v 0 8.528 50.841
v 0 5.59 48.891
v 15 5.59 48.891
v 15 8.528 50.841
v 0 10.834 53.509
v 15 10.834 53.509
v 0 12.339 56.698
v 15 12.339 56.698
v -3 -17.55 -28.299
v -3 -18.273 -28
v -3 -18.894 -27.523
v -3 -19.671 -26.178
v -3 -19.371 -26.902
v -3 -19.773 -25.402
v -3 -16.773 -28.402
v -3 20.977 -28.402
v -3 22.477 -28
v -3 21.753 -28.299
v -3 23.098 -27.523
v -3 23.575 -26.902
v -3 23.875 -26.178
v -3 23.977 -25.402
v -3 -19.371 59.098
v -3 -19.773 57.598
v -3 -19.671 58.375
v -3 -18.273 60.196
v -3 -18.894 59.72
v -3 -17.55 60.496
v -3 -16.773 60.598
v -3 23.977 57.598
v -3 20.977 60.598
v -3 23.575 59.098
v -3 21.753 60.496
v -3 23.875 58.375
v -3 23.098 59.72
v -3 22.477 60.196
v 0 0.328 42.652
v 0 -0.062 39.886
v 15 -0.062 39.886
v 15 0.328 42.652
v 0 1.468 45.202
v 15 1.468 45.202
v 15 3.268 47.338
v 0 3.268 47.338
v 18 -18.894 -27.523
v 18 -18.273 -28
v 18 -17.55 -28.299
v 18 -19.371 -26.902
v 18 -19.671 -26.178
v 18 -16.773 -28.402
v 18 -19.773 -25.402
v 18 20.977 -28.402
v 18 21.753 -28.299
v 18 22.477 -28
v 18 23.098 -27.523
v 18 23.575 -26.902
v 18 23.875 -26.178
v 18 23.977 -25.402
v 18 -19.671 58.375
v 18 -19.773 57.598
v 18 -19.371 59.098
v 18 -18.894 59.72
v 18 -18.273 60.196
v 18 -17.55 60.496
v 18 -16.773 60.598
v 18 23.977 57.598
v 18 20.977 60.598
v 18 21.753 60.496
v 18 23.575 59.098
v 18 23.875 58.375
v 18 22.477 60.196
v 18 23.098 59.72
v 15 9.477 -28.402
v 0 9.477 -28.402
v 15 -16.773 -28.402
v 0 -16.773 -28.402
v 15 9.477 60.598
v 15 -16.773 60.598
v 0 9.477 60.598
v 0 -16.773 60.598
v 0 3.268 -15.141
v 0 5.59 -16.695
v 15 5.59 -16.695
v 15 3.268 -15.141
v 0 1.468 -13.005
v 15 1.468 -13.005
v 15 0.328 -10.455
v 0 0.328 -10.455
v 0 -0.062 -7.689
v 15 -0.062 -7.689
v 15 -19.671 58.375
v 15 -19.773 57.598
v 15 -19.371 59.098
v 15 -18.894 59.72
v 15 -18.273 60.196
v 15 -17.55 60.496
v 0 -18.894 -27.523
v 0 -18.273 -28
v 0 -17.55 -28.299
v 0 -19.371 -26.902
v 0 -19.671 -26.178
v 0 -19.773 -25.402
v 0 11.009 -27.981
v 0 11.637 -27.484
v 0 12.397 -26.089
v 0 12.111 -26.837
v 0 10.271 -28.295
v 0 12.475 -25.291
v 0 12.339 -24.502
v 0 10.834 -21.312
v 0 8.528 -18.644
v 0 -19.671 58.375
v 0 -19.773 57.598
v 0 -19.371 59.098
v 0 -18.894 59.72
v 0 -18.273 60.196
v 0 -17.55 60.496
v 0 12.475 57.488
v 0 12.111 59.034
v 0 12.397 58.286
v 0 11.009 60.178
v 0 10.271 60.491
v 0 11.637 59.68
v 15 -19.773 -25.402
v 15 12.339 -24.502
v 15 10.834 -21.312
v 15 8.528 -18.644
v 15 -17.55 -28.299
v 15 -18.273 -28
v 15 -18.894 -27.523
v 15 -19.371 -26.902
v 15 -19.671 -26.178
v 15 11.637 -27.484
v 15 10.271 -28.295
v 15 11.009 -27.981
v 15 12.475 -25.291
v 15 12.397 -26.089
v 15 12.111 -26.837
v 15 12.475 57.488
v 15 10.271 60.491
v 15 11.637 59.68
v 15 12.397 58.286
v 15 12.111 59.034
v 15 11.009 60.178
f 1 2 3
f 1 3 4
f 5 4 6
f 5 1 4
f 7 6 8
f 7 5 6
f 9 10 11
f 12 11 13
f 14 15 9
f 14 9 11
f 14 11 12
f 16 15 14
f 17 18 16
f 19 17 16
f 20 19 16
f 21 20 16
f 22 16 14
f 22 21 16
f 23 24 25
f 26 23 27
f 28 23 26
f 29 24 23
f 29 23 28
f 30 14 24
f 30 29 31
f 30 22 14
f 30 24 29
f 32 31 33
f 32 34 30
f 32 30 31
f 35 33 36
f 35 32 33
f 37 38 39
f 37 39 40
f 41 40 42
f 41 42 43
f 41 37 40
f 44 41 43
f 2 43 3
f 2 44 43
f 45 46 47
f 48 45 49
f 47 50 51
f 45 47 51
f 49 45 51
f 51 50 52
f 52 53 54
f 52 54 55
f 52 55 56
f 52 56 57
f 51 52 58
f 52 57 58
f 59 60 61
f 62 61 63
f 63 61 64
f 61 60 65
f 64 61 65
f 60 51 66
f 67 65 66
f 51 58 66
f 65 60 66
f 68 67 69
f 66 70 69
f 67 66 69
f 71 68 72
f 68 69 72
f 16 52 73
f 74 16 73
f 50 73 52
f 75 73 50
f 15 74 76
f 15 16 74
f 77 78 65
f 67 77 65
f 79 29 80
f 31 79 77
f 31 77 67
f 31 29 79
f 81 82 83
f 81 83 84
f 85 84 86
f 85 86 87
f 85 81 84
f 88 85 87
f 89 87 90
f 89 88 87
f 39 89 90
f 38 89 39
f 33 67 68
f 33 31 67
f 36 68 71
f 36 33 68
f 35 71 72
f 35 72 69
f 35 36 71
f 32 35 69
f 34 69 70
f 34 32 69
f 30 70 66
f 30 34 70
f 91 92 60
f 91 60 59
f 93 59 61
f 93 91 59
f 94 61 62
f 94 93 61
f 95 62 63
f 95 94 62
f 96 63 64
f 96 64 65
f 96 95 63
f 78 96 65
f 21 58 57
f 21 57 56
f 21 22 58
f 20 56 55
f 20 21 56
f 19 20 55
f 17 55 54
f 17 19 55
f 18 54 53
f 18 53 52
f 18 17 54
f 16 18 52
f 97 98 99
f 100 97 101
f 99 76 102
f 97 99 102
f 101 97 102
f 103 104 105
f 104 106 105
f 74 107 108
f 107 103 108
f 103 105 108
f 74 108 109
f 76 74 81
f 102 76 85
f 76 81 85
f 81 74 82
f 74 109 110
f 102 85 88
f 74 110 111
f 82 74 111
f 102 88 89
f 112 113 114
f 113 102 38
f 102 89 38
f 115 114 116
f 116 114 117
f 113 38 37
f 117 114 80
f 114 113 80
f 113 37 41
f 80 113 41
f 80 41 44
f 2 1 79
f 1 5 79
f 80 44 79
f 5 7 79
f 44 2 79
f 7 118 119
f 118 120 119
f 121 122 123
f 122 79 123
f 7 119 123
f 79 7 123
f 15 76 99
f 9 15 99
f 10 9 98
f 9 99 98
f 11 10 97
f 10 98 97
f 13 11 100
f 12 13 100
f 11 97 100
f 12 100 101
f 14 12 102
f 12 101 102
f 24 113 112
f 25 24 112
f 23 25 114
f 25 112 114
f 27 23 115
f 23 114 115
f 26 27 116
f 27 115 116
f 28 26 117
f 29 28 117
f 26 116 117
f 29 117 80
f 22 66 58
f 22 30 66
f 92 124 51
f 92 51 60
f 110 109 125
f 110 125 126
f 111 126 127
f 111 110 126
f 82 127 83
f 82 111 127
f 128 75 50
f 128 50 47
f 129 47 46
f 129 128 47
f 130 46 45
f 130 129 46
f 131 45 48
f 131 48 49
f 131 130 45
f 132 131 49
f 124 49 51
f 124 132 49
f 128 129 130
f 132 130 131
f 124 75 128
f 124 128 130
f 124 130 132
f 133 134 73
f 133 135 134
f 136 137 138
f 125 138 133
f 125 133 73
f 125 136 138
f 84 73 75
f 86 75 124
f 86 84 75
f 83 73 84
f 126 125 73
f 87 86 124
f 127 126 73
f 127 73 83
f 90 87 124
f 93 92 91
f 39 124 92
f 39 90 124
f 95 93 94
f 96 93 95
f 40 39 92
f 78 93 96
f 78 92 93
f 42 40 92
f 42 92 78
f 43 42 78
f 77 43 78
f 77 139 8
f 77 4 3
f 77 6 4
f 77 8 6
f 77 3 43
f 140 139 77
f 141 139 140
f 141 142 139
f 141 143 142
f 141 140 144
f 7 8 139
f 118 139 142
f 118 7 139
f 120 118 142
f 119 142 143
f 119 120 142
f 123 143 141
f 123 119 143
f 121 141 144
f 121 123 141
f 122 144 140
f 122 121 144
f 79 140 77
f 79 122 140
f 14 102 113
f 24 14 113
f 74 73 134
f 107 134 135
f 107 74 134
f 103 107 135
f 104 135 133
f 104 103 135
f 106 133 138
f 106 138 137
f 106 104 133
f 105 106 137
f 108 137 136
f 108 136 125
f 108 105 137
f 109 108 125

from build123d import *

# Parameters (mm, degrees)
RESSALTO_EXTRUS_O2_DEPTH = 15
RESSALTO_EXTRUS_O3_DEPTH = 3
RESSALTO_EXTRUS_O4_DEPTH = 3


with BuildPart() as part:
    # Esboço2 → Ressalto-extrusão2 (new body)
    with BuildSketch(Plane(origin=(0, 0, 0), x_dir=(0, 0, -1), z_dir=(1, 0, 0))):
        with BuildLine():
            Line((2.90159992, -0.062465938), (-35.09840008, -0.062465938))
            Line((-35.09840008, -0.062465938), (-39.886084903, -0.062465938))
            ThreePointArc((-39.886084903, -0.062465938), (-45.202180234, 1.467638524), (-48.891439328, 5.589707975))
            ThreePointArc((-48.891439328, 5.589707975), (-52.096536948, 9.772081499), (-56.69840008, 12.338743681))
            ThreePointArc((-56.69840008, 12.338743681), (-59.373224015, 11.895603401), (-60.59840008, 9.476926077))
            Line((-60.59840008, 9.476926077), (-60.59840008, 20.976926077))
            ThreePointArc((-60.59840008, 20.976926077), (-59.719720424, 23.09824642), (-57.59840008, 23.976926077))
            Line((-57.59840008, 23.976926077), (25.40159992, 23.976926077))
            ThreePointArc((25.40159992, 23.976926077), (27.522920263, 23.09824642), (28.40159992, 20.976926077))
            Line((28.40159992, 20.976926077), (28.40159992, 9.476926077))
            ThreePointArc((28.40159992, 9.476926077), (27.176423855, 11.895603401), (24.50159992, 12.338743681))
            ThreePointArc((24.50159992, 12.338743681), (19.899736788, 9.772081499), (16.694639168, 5.589707975))
            ThreePointArc((16.694639168, 5.589707975), (13.005380073, 1.467638524), (7.689284743, -0.062465938))
            Line((7.689284743, -0.062465938), (2.90159992, -0.062465938))
        make_face()
    extrude(amount=RESSALTO_EXTRUS_O2_DEPTH)

    # Esboço3 → Ressalto-extrusão3 (add)
    with BuildSketch(Plane.ZY):
        with BuildLine():
            Line((60.59840008, 15.226926077), (60.59840008, 20.976926077))
            ThreePointArc((60.59840008, 20.976926077), (59.719720424, 23.09824642), (57.59840008, 23.976926077))
            Line((57.59840008, 23.976926077), (16.09840008, 23.976926077))
            Line((16.09840008, 23.976926077), (-25.40159992, 23.976926077))
            ThreePointArc((-25.40159992, 23.976926077), (-27.522920263, 23.09824642), (-28.40159992, 20.976926077))
            Line((-28.40159992, 20.976926077), (-28.40159992, 15.226926077))
            Line((-28.40159992, 15.226926077), (-28.40159992, -16.773073923))
            ThreePointArc((-28.40159992, -16.773073923), (-27.522920263, -18.894394267), (-25.40159992, -19.773073923))
            Line((-25.40159992, -19.773073923), (57.59840008, -19.773073923))
            ThreePointArc((57.59840008, -19.773073923), (59.719720424, -18.894394267), (60.59840008, -16.773073923))
            Line((60.59840008, -16.773073923), (60.59840008, 15.226926077))
        make_face()
    extrude(amount=RESSALTO_EXTRUS_O3_DEPTH)

    # Esboço4 → Ressalto-extrusão4 (add)
    with BuildSketch(Plane(origin=(15, 0, 0), x_dir=(0, 0, -1), z_dir=(1, 0, 0))):
        with BuildLine():
            Line((-16.09840008, 23.976926077), (25.40159992, 23.976926077))
            ThreePointArc((25.40159992, 23.976926077), (27.522920263, 23.09824642), (28.40159992, 20.976926077))
            Line((28.40159992, 20.976926077), (28.40159992, 15.226926077))
            Line((28.40159992, 15.226926077), (28.40159992, -16.773073923))
            ThreePointArc((28.40159992, -16.773073923), (27.522920263, -18.894394267), (25.40159992, -19.773073923))
            Line((25.40159992, -19.773073923), (-57.59840008, -19.773073923))
            ThreePointArc((-57.59840008, -19.773073923), (-59.719720424, -18.894394267), (-60.59840008, -16.773073923))
            Line((-60.59840008, -16.773073923), (-60.59840008, 15.226926077))
            Line((-60.59840008, 15.226926077), (-60.59840008, 20.976926077))
            ThreePointArc((-60.59840008, 20.976926077), (-59.719720424, 23.09824642), (-57.59840008, 23.976926077))
            Line((-57.59840008, 23.976926077), (-16.09840008, 23.976926077))
        make_face()
    extrude(amount=RESSALTO_EXTRUS_O4_DEPTH)


solid = part.part
